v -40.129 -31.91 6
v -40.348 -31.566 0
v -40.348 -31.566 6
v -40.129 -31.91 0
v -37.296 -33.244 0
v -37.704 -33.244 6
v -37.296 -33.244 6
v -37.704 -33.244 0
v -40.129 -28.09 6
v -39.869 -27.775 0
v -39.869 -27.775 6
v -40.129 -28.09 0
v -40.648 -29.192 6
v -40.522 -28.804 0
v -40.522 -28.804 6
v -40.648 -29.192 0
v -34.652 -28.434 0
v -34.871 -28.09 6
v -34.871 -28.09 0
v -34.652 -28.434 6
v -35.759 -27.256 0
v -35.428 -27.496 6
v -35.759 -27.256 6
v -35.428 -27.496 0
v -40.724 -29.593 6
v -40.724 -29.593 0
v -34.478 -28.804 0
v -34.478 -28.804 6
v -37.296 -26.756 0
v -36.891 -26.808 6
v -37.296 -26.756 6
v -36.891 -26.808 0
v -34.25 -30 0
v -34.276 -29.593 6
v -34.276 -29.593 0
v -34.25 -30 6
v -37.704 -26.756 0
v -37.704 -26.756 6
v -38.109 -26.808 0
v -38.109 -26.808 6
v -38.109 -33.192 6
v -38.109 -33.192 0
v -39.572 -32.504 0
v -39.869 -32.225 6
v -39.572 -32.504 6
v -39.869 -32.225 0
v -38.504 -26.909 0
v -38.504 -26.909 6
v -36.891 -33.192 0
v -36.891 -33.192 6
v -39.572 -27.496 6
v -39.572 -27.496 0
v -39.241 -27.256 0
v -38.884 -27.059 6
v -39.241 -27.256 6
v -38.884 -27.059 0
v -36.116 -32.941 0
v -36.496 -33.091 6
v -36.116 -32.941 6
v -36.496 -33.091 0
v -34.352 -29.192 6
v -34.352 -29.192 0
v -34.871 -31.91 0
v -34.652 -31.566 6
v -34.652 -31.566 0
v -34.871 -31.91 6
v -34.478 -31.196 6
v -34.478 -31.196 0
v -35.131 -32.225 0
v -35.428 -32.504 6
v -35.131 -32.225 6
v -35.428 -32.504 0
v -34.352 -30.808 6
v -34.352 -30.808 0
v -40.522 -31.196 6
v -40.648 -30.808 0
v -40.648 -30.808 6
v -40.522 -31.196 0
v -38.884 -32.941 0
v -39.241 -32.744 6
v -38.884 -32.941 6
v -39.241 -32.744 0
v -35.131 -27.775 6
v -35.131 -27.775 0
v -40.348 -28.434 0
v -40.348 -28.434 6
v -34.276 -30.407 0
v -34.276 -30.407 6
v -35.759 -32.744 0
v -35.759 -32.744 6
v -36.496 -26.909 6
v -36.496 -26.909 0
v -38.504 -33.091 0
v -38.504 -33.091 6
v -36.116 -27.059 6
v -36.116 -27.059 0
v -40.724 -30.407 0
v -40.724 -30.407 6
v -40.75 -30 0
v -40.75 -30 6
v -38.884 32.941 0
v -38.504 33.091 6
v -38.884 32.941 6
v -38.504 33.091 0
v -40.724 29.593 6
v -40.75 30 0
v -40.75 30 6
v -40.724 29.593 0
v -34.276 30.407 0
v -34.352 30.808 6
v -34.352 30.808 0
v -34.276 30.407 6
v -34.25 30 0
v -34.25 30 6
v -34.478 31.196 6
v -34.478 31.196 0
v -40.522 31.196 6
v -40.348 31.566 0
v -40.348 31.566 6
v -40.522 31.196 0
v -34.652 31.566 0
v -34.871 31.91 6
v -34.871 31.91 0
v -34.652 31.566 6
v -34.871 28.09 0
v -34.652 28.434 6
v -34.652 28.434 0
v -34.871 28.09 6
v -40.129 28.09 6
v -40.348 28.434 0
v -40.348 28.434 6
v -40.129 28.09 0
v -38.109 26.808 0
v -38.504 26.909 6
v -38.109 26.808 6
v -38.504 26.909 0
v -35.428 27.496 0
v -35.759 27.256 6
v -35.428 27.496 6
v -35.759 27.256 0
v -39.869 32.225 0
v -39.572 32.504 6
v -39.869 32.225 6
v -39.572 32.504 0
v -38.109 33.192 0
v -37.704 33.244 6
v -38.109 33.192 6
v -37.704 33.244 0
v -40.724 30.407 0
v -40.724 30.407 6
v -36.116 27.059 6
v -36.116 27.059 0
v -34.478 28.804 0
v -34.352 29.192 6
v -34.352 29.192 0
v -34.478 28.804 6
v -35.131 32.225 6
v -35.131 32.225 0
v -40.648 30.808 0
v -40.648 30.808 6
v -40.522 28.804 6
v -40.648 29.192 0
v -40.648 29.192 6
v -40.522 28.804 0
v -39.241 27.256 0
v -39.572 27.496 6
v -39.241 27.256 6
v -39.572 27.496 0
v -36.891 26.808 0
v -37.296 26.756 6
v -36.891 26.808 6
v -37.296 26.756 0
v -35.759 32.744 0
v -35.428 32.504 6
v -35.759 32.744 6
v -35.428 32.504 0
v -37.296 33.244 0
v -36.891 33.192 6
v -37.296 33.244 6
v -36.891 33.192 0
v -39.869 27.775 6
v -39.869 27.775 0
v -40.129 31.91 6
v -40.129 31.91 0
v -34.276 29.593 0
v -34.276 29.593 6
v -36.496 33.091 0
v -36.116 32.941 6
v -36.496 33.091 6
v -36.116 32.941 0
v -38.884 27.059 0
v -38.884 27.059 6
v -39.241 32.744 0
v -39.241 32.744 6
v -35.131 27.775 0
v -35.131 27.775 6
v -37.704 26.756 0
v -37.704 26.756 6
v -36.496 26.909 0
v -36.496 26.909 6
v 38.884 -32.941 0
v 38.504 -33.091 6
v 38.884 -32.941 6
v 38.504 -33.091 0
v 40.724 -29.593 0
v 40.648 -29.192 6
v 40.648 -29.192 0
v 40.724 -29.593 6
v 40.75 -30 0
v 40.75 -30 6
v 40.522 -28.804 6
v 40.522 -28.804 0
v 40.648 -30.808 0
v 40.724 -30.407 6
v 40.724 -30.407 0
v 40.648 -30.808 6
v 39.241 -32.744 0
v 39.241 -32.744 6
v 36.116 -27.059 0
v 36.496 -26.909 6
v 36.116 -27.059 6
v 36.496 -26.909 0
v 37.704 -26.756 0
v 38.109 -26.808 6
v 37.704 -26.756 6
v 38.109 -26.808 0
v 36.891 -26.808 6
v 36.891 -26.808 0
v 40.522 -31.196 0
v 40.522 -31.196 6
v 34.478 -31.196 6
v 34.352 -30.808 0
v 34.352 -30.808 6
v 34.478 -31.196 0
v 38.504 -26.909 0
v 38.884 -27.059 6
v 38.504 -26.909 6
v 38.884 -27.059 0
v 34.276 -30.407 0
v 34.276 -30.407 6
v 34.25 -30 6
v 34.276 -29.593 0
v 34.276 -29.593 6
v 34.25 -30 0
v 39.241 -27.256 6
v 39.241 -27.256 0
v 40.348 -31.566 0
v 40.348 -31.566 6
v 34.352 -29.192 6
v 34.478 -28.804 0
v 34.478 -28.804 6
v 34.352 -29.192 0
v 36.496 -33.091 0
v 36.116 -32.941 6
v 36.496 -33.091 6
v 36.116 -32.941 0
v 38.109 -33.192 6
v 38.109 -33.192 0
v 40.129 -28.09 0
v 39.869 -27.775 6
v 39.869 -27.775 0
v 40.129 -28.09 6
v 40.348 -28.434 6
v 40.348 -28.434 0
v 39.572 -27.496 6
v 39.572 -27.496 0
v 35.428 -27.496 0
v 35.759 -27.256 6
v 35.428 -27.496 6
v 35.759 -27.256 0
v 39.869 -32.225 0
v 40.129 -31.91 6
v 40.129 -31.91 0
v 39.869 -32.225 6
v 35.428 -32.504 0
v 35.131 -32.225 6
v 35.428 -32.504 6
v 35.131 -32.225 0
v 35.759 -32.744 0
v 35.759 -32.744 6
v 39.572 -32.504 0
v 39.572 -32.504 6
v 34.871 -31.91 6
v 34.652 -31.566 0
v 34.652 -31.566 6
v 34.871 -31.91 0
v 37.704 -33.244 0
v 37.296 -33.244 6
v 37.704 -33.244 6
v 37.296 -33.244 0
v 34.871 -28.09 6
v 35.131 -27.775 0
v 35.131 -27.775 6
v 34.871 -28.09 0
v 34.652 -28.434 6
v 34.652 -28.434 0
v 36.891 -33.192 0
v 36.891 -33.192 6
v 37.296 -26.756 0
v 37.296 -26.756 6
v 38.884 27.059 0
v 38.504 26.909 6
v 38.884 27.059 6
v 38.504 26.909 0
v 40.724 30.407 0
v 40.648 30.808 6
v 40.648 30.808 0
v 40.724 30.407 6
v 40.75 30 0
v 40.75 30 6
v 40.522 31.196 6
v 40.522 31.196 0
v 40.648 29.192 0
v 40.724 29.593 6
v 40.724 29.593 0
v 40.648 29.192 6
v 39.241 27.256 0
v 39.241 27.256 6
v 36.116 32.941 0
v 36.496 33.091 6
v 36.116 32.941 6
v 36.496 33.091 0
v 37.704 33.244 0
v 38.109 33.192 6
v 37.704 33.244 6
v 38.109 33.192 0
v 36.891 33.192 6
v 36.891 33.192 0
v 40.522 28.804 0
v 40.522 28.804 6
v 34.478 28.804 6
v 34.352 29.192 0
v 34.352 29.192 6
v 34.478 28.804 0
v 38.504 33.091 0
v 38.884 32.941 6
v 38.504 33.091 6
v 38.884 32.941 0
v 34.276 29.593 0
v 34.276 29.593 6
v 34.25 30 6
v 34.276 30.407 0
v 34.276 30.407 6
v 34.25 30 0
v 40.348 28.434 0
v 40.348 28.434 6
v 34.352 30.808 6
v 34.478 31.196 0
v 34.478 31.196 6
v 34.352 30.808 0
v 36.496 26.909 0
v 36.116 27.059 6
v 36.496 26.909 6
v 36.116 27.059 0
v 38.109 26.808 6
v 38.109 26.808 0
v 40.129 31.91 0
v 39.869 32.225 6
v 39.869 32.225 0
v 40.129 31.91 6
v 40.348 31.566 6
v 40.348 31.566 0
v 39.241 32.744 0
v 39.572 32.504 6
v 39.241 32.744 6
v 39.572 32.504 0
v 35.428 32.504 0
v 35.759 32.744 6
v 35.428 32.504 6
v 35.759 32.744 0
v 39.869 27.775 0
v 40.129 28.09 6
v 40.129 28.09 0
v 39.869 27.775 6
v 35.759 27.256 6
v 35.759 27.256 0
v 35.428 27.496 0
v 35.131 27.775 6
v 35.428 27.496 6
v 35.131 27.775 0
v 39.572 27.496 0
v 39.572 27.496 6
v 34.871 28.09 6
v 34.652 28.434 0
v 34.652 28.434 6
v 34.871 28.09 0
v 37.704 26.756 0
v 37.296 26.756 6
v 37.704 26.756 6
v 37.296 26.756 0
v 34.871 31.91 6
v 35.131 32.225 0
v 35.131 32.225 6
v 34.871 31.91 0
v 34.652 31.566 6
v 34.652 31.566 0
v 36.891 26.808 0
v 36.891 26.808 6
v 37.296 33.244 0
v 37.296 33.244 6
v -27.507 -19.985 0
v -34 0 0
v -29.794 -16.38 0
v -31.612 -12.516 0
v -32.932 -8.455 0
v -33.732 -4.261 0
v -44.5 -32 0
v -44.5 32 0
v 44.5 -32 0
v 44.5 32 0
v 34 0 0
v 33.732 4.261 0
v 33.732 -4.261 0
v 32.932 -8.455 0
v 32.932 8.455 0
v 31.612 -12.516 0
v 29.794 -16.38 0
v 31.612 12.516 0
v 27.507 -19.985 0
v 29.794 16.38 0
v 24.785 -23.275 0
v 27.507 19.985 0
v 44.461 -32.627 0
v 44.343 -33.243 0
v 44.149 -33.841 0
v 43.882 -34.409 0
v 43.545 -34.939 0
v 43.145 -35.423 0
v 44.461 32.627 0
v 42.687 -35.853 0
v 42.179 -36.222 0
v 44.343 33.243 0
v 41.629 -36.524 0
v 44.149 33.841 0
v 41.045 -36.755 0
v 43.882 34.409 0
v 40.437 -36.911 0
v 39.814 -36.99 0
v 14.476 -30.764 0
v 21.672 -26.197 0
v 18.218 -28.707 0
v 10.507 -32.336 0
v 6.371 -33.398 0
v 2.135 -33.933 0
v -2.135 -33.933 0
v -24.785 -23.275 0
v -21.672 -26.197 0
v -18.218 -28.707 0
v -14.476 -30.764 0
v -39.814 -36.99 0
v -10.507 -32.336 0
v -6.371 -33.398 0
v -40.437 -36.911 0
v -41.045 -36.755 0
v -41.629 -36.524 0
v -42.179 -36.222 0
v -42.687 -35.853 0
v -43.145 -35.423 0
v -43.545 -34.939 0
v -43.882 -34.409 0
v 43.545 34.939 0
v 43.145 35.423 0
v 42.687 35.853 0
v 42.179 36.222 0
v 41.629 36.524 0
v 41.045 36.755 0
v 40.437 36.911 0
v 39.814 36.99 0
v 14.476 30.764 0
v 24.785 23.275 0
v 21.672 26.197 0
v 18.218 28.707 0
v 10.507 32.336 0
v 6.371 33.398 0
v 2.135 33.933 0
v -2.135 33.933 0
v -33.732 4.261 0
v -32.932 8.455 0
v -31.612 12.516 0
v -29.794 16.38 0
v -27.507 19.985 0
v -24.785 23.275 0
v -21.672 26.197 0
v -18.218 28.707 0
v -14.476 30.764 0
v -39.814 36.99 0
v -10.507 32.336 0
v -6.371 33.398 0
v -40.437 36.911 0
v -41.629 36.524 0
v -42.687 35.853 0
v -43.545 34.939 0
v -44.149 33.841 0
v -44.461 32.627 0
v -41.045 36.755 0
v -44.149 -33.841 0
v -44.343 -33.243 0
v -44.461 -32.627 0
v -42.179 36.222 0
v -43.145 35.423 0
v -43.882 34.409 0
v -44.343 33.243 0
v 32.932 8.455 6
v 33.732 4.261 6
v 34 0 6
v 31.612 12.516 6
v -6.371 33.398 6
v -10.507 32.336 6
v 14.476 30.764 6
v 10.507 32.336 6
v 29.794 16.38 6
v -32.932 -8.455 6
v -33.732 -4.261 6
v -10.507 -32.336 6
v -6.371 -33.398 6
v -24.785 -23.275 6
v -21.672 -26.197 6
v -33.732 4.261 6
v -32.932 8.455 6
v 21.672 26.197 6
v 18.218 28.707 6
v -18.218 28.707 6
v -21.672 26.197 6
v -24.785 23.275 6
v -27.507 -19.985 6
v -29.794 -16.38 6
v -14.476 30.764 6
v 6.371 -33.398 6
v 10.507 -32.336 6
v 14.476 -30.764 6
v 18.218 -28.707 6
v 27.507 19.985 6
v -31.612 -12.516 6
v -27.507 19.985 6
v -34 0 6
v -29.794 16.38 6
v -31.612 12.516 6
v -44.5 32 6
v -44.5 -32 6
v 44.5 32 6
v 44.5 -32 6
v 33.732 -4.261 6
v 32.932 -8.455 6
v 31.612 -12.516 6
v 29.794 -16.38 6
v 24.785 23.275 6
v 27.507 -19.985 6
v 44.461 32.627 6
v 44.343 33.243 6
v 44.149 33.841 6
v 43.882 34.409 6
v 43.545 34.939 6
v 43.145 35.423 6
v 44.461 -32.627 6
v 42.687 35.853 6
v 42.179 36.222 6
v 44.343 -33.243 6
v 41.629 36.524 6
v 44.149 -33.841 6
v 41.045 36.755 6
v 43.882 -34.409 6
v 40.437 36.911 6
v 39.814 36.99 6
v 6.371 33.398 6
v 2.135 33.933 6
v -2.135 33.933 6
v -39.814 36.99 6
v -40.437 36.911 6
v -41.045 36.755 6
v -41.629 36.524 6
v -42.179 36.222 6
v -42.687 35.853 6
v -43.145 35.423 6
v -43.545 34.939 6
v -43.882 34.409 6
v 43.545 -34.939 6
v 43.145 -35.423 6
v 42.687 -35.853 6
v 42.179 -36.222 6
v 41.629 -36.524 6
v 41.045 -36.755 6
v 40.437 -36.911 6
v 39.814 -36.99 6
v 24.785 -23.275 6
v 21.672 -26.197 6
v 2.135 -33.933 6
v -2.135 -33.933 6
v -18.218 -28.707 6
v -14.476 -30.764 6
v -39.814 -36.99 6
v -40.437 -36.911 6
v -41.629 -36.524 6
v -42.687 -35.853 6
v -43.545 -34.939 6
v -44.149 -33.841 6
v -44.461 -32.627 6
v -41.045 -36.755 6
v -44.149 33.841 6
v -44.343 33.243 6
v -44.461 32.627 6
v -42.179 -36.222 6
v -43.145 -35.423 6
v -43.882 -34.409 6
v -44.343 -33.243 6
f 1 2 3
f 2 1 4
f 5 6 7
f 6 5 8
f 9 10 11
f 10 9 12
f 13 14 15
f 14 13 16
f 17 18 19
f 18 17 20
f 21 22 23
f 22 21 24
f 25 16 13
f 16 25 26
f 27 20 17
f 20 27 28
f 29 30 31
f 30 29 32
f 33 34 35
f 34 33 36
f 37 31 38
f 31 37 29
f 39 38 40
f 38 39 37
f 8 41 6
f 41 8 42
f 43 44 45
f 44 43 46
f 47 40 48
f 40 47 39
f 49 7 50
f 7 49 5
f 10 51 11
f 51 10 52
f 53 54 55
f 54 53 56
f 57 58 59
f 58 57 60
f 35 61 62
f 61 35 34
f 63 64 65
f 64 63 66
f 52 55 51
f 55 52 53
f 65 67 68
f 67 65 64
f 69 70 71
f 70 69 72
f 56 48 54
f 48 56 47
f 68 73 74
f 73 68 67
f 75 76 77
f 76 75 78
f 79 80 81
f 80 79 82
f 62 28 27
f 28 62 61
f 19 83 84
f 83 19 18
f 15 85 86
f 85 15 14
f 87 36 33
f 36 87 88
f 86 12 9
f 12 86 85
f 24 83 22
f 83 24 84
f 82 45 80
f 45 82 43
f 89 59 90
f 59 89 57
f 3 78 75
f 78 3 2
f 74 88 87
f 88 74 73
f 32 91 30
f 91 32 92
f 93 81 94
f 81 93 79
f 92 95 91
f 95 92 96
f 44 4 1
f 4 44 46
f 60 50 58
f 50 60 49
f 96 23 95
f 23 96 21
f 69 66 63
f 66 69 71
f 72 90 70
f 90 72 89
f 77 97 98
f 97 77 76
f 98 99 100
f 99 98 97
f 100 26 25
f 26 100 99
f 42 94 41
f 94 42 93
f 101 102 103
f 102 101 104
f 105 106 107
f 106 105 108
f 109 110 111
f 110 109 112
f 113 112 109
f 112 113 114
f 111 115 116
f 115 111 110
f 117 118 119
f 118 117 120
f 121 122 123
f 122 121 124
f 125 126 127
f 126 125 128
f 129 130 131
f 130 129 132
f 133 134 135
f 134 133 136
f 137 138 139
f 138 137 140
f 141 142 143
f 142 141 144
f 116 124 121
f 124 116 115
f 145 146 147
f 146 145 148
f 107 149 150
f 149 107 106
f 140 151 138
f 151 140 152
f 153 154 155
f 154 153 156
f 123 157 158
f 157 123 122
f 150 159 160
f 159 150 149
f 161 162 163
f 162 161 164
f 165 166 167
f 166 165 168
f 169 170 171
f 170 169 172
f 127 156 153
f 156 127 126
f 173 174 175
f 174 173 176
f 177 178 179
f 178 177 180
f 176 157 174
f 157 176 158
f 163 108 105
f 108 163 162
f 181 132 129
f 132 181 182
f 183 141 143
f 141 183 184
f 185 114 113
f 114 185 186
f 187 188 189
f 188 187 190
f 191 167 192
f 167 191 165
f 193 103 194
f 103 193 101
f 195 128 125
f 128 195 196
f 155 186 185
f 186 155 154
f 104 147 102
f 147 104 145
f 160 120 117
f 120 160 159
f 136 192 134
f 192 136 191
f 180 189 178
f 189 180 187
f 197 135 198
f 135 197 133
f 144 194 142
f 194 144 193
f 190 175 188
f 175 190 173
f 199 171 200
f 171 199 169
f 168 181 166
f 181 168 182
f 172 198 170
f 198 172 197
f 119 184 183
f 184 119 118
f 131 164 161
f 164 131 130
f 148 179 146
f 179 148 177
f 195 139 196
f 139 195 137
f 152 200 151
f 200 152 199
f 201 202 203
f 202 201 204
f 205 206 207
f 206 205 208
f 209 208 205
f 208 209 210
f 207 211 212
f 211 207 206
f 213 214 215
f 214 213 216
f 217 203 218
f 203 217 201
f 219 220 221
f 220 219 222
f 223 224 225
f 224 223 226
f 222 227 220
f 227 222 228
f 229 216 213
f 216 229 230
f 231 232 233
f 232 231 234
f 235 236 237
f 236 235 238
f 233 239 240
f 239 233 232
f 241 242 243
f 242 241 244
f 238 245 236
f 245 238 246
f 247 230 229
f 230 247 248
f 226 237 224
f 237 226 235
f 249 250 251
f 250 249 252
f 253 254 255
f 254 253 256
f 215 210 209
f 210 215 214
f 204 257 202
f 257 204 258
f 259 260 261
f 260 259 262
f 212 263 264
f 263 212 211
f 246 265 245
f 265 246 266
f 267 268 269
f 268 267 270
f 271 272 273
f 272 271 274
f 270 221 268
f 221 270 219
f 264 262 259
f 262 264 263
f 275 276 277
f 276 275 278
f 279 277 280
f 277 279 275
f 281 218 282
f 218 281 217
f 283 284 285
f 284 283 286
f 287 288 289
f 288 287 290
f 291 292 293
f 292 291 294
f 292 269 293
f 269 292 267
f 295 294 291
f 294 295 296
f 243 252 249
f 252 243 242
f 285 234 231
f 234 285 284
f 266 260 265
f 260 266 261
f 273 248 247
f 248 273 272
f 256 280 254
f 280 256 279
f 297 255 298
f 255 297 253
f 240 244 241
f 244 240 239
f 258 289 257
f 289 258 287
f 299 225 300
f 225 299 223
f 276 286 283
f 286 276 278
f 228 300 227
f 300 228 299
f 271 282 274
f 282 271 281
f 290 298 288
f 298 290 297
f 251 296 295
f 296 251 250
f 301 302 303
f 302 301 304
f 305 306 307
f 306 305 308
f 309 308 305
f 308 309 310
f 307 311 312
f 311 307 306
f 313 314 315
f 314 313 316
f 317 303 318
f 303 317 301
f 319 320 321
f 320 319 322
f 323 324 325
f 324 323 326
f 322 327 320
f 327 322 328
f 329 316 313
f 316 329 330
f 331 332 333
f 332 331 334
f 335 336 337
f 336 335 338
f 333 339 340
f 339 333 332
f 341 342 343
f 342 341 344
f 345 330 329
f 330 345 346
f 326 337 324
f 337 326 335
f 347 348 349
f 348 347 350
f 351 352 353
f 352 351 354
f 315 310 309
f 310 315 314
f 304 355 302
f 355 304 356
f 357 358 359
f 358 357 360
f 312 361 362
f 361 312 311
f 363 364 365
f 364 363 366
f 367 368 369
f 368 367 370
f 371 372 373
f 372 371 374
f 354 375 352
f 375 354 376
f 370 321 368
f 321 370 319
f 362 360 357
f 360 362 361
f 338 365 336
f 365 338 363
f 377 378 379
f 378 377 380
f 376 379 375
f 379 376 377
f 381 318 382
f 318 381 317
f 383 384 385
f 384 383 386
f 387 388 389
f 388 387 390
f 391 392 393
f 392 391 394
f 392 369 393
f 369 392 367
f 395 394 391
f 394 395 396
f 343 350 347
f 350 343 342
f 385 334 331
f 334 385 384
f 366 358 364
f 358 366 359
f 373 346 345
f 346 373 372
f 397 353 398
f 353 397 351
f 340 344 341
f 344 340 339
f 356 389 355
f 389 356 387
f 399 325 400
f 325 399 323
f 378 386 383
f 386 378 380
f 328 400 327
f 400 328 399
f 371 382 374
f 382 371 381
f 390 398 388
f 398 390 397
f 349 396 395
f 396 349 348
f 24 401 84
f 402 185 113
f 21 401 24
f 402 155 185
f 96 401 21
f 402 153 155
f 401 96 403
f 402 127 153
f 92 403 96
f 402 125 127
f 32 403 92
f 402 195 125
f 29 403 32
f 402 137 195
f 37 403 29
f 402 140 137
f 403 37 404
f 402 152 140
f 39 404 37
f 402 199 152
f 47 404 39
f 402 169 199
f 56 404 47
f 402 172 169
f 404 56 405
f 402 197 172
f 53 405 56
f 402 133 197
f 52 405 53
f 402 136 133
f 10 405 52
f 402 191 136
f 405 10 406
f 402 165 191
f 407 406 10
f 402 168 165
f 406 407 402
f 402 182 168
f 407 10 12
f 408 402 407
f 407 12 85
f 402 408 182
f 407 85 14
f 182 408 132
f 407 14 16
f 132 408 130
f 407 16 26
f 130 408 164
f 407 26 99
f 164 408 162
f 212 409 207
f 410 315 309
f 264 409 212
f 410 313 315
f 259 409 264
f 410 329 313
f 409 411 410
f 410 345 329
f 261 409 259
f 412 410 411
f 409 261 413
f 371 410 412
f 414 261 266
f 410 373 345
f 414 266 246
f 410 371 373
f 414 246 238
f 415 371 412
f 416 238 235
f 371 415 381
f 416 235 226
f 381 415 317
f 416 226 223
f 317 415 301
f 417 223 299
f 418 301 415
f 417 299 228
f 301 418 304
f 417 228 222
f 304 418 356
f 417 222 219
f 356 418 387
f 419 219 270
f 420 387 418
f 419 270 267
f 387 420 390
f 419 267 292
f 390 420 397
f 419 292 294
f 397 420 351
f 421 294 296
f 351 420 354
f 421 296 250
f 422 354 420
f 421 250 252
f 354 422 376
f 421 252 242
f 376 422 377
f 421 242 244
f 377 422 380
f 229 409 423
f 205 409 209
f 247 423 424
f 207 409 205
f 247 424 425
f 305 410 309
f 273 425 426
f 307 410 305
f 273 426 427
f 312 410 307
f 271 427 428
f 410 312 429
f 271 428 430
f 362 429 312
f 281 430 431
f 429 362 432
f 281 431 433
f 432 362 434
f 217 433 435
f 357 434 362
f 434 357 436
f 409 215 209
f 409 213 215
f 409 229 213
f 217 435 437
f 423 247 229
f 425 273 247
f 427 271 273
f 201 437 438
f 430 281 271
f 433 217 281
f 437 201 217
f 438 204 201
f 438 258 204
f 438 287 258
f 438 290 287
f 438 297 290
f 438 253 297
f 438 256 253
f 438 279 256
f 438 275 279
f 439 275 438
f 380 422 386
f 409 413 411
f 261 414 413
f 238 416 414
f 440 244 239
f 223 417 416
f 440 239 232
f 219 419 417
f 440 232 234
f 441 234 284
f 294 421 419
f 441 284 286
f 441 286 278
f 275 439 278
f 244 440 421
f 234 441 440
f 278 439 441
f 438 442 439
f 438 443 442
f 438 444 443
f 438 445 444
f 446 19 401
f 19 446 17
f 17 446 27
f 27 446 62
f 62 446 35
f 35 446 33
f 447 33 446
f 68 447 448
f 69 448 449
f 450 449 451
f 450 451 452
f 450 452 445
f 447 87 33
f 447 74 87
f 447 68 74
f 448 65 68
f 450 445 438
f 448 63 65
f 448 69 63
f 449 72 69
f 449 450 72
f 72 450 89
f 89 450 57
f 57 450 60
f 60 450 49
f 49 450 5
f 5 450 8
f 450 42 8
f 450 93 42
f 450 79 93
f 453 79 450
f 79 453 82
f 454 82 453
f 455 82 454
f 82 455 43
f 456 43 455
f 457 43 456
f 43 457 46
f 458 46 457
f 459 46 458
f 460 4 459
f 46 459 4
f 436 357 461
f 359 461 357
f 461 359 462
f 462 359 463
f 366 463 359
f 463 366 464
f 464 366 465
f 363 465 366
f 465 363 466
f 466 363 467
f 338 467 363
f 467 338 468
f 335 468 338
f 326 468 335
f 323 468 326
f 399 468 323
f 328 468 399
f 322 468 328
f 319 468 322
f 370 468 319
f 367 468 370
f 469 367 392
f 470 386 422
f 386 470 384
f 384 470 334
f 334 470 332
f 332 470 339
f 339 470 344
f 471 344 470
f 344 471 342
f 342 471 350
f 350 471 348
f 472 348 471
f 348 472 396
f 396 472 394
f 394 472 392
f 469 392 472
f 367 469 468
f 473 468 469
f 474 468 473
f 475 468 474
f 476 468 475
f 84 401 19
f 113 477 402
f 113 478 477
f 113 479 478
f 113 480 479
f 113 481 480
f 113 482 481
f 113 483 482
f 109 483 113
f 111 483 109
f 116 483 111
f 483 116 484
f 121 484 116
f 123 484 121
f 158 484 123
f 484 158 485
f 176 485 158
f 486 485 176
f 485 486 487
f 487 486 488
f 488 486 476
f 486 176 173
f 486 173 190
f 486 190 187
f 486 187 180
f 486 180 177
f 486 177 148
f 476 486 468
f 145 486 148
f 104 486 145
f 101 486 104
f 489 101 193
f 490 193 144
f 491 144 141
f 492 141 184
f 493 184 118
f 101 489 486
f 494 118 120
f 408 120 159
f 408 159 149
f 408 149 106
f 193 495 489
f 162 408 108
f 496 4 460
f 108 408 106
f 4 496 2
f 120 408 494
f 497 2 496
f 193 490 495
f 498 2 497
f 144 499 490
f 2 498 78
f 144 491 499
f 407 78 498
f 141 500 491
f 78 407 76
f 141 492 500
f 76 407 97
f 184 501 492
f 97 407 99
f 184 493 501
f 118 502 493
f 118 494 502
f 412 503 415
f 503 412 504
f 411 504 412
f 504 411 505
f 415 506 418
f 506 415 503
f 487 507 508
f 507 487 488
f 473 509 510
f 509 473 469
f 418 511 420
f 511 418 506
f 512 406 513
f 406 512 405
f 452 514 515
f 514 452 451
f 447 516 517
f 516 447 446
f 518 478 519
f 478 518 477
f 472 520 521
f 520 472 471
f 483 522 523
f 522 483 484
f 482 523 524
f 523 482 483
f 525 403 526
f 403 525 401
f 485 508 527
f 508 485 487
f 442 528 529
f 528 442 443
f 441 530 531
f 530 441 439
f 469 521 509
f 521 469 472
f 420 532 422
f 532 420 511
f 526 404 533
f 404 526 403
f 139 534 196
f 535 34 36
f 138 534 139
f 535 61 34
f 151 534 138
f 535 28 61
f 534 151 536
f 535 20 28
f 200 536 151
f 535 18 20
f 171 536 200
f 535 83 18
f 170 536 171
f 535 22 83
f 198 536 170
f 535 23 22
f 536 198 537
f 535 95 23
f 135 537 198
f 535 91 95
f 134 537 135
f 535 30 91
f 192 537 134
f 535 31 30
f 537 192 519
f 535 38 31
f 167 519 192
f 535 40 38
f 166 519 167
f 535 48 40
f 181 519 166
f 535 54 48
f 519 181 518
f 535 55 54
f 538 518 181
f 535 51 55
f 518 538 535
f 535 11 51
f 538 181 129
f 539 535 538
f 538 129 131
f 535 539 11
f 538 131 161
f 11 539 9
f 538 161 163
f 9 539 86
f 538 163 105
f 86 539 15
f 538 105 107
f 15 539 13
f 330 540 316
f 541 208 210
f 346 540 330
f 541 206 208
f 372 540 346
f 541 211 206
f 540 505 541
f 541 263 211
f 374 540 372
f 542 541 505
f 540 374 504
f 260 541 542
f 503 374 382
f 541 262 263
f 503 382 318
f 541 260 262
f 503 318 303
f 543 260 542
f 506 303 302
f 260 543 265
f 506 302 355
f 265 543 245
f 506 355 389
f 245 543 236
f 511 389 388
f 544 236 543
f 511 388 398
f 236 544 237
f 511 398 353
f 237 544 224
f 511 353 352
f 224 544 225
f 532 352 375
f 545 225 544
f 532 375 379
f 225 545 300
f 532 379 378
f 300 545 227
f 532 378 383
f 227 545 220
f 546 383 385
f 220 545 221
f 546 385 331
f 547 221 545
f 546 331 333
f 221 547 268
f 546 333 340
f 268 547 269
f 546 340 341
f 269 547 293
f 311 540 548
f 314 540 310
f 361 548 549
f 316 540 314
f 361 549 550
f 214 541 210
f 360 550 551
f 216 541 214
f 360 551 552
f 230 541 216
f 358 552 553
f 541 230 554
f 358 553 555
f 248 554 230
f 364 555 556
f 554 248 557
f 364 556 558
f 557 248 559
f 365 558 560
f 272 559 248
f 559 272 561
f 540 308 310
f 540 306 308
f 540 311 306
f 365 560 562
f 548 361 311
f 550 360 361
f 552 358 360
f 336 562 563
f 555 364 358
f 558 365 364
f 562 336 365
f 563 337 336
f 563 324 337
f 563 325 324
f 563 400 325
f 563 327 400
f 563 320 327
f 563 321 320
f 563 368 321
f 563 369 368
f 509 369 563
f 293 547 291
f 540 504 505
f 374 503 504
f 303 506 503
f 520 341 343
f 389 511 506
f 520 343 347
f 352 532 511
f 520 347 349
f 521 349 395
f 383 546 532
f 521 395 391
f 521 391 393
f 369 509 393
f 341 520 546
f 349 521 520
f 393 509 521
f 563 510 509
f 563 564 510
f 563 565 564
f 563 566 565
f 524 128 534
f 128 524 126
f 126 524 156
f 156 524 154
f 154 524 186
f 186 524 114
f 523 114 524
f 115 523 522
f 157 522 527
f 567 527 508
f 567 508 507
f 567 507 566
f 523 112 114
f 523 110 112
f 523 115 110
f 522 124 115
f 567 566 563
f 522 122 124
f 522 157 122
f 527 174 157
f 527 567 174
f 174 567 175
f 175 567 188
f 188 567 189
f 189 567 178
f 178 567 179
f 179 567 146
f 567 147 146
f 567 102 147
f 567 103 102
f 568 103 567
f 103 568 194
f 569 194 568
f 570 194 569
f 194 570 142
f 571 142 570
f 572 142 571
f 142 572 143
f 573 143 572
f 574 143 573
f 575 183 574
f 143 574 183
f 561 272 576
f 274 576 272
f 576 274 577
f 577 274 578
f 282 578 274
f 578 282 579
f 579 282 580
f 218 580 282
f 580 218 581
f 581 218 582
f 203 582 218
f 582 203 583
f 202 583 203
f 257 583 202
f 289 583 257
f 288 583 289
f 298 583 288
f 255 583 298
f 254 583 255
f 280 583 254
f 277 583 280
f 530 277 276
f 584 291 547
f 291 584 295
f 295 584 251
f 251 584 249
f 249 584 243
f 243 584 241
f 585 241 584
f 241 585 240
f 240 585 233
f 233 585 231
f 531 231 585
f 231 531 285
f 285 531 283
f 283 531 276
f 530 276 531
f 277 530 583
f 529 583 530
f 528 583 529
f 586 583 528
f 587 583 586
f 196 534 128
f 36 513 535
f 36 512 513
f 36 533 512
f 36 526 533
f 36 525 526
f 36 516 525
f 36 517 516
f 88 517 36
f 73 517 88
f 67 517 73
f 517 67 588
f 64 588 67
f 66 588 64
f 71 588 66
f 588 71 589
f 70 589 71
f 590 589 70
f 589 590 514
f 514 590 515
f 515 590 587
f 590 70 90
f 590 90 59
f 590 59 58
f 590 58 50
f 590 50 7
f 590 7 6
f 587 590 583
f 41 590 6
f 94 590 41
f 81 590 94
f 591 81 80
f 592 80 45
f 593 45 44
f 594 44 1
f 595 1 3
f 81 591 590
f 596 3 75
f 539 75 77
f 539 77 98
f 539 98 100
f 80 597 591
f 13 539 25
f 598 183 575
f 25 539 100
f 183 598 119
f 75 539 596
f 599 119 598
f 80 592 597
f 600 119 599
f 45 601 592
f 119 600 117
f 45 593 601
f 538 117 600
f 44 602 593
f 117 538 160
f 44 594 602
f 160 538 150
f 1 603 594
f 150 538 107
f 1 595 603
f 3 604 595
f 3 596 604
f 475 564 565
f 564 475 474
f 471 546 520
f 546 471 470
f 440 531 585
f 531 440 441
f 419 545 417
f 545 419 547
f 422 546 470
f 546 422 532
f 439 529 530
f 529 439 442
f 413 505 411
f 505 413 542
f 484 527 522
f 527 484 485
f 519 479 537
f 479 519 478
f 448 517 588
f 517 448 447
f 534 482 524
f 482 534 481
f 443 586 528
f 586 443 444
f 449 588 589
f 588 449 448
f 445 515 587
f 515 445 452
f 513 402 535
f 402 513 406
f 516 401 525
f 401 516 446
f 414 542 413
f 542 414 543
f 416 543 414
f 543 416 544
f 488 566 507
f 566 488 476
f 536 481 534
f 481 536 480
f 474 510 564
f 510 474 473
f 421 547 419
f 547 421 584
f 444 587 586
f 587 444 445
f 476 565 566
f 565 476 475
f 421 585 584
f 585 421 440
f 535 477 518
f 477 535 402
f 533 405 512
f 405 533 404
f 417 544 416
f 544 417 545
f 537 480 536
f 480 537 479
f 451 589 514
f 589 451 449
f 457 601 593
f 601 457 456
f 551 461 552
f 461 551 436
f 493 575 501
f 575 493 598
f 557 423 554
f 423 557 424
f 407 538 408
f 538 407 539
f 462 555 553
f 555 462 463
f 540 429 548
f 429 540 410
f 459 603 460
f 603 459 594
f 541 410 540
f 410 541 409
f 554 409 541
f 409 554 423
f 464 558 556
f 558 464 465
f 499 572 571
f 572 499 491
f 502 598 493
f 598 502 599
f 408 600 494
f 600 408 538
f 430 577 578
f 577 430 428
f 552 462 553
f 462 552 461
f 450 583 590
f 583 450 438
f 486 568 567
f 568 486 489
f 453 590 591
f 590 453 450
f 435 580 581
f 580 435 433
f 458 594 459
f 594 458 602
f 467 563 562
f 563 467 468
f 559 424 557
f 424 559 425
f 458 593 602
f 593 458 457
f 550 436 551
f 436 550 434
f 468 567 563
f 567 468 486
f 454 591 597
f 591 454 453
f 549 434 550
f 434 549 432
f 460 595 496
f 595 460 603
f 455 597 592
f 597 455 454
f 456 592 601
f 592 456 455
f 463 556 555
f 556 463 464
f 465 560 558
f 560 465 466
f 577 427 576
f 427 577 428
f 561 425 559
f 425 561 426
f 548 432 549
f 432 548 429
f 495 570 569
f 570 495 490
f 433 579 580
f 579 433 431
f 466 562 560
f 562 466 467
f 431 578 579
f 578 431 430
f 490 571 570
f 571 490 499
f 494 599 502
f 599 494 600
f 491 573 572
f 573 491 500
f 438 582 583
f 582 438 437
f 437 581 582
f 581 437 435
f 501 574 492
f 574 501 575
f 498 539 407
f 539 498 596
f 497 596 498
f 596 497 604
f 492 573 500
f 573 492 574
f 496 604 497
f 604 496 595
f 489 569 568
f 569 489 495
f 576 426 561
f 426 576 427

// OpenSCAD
$fn = 50;


difference() {
	union() {
		hull() {
			translate(v = [-39.5000000000, 32.0000000000, 0]) {
				cylinder(h = 6, r = 5);
			}
			translate(v = [39.5000000000, 32.0000000000, 0]) {
				cylinder(h = 6, r = 5);
			}
			translate(v = [-39.5000000000, -32.0000000000, 0]) {
				cylinder(h = 6, r = 5);
			}
			translate(v = [39.5000000000, -32.0000000000, 0]) {
				cylinder(h = 6, r = 5);
			}
		}
	}
	union() {
		#translate(v = [-37.5000000000, -30.0000000000, -100.0000000000]) {
			cylinder(h = 200, r = 3.2500000000);
		}
		#translate(v = [-37.5000000000, 30.0000000000, -100.0000000000]) {
			cylinder(h = 200, r = 3.2500000000);
		}
		#translate(v = [37.5000000000, -30.0000000000, -100.0000000000]) {
			cylinder(h = 200, r = 3.2500000000);
		}
		#translate(v = [37.5000000000, 30.0000000000, -100.0000000000]) {
			cylinder(h = 200, r = 3.2500000000);
		}
		#cylinder(h = 6, r = 34.0000000000);
	}
}
